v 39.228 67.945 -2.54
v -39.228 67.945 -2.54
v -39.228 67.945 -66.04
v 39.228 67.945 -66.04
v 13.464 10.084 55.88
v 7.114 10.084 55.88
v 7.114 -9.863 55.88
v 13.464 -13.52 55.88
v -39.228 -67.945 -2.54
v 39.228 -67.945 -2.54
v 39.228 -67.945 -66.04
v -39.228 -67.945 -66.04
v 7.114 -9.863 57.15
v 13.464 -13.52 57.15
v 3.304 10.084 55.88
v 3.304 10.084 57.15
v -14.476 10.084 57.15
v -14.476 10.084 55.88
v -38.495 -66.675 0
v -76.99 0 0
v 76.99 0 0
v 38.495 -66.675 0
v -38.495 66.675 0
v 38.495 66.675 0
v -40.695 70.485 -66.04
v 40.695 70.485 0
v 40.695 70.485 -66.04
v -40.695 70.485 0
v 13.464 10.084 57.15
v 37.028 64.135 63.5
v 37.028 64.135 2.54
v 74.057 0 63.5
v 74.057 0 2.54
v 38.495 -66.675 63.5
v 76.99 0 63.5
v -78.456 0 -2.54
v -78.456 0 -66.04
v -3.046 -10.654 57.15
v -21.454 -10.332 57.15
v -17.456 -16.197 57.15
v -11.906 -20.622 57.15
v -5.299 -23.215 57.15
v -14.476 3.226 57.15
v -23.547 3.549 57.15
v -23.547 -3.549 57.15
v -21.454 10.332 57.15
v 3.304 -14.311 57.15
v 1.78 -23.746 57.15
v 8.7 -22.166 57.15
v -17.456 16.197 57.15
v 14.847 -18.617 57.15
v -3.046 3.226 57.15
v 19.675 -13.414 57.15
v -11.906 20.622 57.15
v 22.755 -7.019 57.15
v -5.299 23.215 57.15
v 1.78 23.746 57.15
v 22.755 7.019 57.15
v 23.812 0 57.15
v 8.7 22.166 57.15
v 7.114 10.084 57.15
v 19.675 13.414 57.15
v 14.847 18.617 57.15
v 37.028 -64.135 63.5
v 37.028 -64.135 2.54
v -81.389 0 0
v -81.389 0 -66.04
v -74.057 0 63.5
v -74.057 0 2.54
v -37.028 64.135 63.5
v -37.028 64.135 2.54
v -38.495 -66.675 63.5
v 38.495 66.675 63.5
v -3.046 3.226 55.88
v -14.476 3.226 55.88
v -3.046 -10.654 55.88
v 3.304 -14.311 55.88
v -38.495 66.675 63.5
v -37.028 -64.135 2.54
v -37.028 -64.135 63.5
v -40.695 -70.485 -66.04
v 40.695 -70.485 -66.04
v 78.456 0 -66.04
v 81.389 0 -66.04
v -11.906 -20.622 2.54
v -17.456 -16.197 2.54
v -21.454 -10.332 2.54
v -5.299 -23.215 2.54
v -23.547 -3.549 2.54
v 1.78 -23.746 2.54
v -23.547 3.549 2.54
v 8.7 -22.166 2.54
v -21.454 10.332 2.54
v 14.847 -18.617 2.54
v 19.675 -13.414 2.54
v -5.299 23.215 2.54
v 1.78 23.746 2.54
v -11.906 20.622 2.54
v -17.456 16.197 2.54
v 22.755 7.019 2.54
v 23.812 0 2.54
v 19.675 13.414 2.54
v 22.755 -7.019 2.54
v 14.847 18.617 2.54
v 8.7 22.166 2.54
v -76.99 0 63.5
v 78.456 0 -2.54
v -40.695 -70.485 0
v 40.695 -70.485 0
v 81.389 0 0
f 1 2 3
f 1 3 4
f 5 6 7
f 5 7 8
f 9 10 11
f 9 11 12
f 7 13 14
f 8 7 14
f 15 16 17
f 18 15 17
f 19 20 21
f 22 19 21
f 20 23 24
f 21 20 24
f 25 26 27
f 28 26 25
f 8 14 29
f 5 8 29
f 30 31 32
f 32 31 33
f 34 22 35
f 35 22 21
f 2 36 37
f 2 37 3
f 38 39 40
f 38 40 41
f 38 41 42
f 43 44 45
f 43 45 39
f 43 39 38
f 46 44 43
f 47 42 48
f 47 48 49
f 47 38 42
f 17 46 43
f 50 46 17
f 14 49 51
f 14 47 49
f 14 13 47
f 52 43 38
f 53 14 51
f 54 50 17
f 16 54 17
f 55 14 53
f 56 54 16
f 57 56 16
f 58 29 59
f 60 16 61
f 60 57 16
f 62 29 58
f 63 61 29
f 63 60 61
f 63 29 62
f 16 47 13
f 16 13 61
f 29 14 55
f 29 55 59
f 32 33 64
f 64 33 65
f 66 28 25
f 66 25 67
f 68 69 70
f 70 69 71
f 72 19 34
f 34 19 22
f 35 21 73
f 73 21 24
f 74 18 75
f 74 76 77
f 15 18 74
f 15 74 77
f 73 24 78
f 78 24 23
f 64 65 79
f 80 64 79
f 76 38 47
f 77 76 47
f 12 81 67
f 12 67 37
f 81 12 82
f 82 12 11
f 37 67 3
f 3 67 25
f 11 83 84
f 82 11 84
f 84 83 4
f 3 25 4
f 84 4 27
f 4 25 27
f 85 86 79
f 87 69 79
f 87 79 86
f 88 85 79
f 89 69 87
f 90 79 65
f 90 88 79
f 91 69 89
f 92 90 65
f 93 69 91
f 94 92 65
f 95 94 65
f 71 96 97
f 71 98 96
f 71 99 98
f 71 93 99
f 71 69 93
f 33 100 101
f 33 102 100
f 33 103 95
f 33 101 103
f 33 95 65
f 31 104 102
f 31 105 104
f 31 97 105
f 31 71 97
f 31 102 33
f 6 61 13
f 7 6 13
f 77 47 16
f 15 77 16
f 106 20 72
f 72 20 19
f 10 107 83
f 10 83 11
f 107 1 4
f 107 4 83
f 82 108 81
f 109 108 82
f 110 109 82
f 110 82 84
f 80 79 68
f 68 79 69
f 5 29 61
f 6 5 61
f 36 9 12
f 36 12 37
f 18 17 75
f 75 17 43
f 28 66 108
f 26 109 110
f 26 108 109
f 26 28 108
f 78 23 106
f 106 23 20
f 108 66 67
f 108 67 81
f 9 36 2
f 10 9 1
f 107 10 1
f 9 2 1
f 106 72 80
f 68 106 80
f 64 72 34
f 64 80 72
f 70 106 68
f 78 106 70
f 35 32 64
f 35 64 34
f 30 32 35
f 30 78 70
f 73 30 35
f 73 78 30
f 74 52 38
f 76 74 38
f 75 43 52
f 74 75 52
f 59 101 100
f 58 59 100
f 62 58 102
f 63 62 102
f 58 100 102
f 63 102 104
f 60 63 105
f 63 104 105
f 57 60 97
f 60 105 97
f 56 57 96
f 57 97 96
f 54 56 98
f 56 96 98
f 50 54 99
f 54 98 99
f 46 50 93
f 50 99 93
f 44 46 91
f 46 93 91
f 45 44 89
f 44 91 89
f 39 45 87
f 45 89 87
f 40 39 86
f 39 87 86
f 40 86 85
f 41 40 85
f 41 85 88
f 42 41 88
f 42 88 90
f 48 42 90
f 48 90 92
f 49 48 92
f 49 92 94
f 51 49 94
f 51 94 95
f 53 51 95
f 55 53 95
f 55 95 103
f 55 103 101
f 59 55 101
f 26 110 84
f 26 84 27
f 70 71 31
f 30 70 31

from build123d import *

# Parameters (mm, degrees)
F1_DEPTH = 63.5
F0_R     = 23.8125
F2_DEPTH = 2.54
F3_DEPTH = 57.15
F4_DEPTH = 66.04
F5_DEPTH = 2.54
F7_DEPTH = 1.27


with BuildPart() as f1:
    # F0 (on Top) → F1 (new body)
    with BuildSketch(Plane.XY):
        Polygon((38.4948291982, 66.675), (-38.4948291982, 66.675), (-76.9896583964, 0), (-38.4948291982, -66.675), (38.4948291982, -66.675), (76.9896583964, 0), align=None)
        Polygon((-37.0283595145, 64.135), (37.0283595145, 64.135), (74.056719029, 0), (37.0283595145, -64.135), (-37.0283595145, -64.135), (-74.056719029, 0), align=None, mode=Mode.SUBTRACT)
    extrude(amount=F1_DEPTH)

    # F0 (on Top) → F2 (join)
    with BuildSketch(Plane.XY):
        Polygon((74.056719029, 0), (37.0283595145, 64.135), (-37.0283595145, 64.135), (-74.056719029, 0), (-37.0283595145, -64.135), (37.0283595145, -64.135), align=None)
        Circle(F0_R, mode=Mode.SUBTRACT)
    extrude(amount=F2_DEPTH)

    # F0 (on Top) → F3 (join)
    with BuildSketch(Plane.XY):
        Circle(F0_R)
    extrude(amount=F3_DEPTH)

    # F6 (on face) → F7 (cut)
    with BuildSketch(Plane.XY.offset(57.15)):
        Polygon((13.4640260006, -13.5201268494), (13.4640260006, 10.0844563534), (7.1140260006, 10.0844563534), (7.1140260006, -9.8625252509), align=None)
        Polygon((3.3040260006, -14.3112281538), (3.3040260006, 10.0844563534), (-14.4759739994, 10.0844563534), (-14.4759739994, 3.2264567894), (-3.0459739994, 3.2264567894), (-3.0459739994, -10.6536265554), align=None)
    extrude(amount=-F7_DEPTH, mode=Mode.SUBTRACT)


with BuildPart() as f4:
    # F0 (on Top) → F4 (new body)
    with BuildSketch(Plane.XY):
        Polygon((40.6945337238, -70.485), (81.3890674477, 0), (40.6945337238, 70.485), (-40.6945337238, 70.485), (-81.3890674477, 0), (-40.6945337238, -70.485), align=None)
        Polygon((39.2280640401, 67.945), (78.4561280802, 0), (39.2280640401, -67.945), (-39.2280640401, -67.945), (-78.4561280802, 0), (-39.2280640401, 67.945), align=None, mode=Mode.SUBTRACT)
    extrude(amount=-F4_DEPTH)

    # F0 (on Top) → F5 (join)
    with BuildSketch(Plane.XY):
        Polygon((40.6945337238, -70.485), (81.3890674477, 0), (40.6945337238, 70.485), (-40.6945337238, 70.485), (-81.3890674477, 0), (-40.6945337238, -70.485), align=None)
        Polygon((39.2280640401, 67.945), (78.4561280802, 0), (39.2280640401, -67.945), (-39.2280640401, -67.945), (-78.4561280802, 0), (-39.2280640401, 67.945), align=None, mode=Mode.SUBTRACT)
        Polygon((39.2280640401, -67.945), (78.4561280802, 0), (39.2280640401, 67.945), (-39.2280640401, 67.945), (-78.4561280802, 0), (-39.2280640401, -67.945), align=None)
        Polygon((-76.9896583964, 0), (-38.4948291982, 66.675), (38.4948291982, 66.675), (76.9896583964, 0), (38.4948291982, -66.675), (-38.4948291982, -66.675), align=None, mode=Mode.SUBTRACT)
        Polygon((38.4948291982, 66.675), (-38.4948291982, 66.675), (-76.9896583964, 0), (-38.4948291982, -66.675), (38.4948291982, -66.675), (76.9896583964, 0), align=None)
        Polygon((-37.0283595145, 64.135), (37.0283595145, 64.135), (74.056719029, 0), (37.0283595145, -64.135), (-37.0283595145, -64.135), (-74.056719029, 0), align=None, mode=Mode.SUBTRACT)
        Polygon((74.056719029, 0), (37.0283595145, 64.135), (-37.0283595145, 64.135), (-74.056719029, 0), (-37.0283595145, -64.135), (37.0283595145, -64.135), align=None)
        Circle(F0_R, mode=Mode.SUBTRACT)
        Circle(F0_R)
    extrude(amount=-F5_DEPTH)


solid = Compound([f1.part, f4.part])
